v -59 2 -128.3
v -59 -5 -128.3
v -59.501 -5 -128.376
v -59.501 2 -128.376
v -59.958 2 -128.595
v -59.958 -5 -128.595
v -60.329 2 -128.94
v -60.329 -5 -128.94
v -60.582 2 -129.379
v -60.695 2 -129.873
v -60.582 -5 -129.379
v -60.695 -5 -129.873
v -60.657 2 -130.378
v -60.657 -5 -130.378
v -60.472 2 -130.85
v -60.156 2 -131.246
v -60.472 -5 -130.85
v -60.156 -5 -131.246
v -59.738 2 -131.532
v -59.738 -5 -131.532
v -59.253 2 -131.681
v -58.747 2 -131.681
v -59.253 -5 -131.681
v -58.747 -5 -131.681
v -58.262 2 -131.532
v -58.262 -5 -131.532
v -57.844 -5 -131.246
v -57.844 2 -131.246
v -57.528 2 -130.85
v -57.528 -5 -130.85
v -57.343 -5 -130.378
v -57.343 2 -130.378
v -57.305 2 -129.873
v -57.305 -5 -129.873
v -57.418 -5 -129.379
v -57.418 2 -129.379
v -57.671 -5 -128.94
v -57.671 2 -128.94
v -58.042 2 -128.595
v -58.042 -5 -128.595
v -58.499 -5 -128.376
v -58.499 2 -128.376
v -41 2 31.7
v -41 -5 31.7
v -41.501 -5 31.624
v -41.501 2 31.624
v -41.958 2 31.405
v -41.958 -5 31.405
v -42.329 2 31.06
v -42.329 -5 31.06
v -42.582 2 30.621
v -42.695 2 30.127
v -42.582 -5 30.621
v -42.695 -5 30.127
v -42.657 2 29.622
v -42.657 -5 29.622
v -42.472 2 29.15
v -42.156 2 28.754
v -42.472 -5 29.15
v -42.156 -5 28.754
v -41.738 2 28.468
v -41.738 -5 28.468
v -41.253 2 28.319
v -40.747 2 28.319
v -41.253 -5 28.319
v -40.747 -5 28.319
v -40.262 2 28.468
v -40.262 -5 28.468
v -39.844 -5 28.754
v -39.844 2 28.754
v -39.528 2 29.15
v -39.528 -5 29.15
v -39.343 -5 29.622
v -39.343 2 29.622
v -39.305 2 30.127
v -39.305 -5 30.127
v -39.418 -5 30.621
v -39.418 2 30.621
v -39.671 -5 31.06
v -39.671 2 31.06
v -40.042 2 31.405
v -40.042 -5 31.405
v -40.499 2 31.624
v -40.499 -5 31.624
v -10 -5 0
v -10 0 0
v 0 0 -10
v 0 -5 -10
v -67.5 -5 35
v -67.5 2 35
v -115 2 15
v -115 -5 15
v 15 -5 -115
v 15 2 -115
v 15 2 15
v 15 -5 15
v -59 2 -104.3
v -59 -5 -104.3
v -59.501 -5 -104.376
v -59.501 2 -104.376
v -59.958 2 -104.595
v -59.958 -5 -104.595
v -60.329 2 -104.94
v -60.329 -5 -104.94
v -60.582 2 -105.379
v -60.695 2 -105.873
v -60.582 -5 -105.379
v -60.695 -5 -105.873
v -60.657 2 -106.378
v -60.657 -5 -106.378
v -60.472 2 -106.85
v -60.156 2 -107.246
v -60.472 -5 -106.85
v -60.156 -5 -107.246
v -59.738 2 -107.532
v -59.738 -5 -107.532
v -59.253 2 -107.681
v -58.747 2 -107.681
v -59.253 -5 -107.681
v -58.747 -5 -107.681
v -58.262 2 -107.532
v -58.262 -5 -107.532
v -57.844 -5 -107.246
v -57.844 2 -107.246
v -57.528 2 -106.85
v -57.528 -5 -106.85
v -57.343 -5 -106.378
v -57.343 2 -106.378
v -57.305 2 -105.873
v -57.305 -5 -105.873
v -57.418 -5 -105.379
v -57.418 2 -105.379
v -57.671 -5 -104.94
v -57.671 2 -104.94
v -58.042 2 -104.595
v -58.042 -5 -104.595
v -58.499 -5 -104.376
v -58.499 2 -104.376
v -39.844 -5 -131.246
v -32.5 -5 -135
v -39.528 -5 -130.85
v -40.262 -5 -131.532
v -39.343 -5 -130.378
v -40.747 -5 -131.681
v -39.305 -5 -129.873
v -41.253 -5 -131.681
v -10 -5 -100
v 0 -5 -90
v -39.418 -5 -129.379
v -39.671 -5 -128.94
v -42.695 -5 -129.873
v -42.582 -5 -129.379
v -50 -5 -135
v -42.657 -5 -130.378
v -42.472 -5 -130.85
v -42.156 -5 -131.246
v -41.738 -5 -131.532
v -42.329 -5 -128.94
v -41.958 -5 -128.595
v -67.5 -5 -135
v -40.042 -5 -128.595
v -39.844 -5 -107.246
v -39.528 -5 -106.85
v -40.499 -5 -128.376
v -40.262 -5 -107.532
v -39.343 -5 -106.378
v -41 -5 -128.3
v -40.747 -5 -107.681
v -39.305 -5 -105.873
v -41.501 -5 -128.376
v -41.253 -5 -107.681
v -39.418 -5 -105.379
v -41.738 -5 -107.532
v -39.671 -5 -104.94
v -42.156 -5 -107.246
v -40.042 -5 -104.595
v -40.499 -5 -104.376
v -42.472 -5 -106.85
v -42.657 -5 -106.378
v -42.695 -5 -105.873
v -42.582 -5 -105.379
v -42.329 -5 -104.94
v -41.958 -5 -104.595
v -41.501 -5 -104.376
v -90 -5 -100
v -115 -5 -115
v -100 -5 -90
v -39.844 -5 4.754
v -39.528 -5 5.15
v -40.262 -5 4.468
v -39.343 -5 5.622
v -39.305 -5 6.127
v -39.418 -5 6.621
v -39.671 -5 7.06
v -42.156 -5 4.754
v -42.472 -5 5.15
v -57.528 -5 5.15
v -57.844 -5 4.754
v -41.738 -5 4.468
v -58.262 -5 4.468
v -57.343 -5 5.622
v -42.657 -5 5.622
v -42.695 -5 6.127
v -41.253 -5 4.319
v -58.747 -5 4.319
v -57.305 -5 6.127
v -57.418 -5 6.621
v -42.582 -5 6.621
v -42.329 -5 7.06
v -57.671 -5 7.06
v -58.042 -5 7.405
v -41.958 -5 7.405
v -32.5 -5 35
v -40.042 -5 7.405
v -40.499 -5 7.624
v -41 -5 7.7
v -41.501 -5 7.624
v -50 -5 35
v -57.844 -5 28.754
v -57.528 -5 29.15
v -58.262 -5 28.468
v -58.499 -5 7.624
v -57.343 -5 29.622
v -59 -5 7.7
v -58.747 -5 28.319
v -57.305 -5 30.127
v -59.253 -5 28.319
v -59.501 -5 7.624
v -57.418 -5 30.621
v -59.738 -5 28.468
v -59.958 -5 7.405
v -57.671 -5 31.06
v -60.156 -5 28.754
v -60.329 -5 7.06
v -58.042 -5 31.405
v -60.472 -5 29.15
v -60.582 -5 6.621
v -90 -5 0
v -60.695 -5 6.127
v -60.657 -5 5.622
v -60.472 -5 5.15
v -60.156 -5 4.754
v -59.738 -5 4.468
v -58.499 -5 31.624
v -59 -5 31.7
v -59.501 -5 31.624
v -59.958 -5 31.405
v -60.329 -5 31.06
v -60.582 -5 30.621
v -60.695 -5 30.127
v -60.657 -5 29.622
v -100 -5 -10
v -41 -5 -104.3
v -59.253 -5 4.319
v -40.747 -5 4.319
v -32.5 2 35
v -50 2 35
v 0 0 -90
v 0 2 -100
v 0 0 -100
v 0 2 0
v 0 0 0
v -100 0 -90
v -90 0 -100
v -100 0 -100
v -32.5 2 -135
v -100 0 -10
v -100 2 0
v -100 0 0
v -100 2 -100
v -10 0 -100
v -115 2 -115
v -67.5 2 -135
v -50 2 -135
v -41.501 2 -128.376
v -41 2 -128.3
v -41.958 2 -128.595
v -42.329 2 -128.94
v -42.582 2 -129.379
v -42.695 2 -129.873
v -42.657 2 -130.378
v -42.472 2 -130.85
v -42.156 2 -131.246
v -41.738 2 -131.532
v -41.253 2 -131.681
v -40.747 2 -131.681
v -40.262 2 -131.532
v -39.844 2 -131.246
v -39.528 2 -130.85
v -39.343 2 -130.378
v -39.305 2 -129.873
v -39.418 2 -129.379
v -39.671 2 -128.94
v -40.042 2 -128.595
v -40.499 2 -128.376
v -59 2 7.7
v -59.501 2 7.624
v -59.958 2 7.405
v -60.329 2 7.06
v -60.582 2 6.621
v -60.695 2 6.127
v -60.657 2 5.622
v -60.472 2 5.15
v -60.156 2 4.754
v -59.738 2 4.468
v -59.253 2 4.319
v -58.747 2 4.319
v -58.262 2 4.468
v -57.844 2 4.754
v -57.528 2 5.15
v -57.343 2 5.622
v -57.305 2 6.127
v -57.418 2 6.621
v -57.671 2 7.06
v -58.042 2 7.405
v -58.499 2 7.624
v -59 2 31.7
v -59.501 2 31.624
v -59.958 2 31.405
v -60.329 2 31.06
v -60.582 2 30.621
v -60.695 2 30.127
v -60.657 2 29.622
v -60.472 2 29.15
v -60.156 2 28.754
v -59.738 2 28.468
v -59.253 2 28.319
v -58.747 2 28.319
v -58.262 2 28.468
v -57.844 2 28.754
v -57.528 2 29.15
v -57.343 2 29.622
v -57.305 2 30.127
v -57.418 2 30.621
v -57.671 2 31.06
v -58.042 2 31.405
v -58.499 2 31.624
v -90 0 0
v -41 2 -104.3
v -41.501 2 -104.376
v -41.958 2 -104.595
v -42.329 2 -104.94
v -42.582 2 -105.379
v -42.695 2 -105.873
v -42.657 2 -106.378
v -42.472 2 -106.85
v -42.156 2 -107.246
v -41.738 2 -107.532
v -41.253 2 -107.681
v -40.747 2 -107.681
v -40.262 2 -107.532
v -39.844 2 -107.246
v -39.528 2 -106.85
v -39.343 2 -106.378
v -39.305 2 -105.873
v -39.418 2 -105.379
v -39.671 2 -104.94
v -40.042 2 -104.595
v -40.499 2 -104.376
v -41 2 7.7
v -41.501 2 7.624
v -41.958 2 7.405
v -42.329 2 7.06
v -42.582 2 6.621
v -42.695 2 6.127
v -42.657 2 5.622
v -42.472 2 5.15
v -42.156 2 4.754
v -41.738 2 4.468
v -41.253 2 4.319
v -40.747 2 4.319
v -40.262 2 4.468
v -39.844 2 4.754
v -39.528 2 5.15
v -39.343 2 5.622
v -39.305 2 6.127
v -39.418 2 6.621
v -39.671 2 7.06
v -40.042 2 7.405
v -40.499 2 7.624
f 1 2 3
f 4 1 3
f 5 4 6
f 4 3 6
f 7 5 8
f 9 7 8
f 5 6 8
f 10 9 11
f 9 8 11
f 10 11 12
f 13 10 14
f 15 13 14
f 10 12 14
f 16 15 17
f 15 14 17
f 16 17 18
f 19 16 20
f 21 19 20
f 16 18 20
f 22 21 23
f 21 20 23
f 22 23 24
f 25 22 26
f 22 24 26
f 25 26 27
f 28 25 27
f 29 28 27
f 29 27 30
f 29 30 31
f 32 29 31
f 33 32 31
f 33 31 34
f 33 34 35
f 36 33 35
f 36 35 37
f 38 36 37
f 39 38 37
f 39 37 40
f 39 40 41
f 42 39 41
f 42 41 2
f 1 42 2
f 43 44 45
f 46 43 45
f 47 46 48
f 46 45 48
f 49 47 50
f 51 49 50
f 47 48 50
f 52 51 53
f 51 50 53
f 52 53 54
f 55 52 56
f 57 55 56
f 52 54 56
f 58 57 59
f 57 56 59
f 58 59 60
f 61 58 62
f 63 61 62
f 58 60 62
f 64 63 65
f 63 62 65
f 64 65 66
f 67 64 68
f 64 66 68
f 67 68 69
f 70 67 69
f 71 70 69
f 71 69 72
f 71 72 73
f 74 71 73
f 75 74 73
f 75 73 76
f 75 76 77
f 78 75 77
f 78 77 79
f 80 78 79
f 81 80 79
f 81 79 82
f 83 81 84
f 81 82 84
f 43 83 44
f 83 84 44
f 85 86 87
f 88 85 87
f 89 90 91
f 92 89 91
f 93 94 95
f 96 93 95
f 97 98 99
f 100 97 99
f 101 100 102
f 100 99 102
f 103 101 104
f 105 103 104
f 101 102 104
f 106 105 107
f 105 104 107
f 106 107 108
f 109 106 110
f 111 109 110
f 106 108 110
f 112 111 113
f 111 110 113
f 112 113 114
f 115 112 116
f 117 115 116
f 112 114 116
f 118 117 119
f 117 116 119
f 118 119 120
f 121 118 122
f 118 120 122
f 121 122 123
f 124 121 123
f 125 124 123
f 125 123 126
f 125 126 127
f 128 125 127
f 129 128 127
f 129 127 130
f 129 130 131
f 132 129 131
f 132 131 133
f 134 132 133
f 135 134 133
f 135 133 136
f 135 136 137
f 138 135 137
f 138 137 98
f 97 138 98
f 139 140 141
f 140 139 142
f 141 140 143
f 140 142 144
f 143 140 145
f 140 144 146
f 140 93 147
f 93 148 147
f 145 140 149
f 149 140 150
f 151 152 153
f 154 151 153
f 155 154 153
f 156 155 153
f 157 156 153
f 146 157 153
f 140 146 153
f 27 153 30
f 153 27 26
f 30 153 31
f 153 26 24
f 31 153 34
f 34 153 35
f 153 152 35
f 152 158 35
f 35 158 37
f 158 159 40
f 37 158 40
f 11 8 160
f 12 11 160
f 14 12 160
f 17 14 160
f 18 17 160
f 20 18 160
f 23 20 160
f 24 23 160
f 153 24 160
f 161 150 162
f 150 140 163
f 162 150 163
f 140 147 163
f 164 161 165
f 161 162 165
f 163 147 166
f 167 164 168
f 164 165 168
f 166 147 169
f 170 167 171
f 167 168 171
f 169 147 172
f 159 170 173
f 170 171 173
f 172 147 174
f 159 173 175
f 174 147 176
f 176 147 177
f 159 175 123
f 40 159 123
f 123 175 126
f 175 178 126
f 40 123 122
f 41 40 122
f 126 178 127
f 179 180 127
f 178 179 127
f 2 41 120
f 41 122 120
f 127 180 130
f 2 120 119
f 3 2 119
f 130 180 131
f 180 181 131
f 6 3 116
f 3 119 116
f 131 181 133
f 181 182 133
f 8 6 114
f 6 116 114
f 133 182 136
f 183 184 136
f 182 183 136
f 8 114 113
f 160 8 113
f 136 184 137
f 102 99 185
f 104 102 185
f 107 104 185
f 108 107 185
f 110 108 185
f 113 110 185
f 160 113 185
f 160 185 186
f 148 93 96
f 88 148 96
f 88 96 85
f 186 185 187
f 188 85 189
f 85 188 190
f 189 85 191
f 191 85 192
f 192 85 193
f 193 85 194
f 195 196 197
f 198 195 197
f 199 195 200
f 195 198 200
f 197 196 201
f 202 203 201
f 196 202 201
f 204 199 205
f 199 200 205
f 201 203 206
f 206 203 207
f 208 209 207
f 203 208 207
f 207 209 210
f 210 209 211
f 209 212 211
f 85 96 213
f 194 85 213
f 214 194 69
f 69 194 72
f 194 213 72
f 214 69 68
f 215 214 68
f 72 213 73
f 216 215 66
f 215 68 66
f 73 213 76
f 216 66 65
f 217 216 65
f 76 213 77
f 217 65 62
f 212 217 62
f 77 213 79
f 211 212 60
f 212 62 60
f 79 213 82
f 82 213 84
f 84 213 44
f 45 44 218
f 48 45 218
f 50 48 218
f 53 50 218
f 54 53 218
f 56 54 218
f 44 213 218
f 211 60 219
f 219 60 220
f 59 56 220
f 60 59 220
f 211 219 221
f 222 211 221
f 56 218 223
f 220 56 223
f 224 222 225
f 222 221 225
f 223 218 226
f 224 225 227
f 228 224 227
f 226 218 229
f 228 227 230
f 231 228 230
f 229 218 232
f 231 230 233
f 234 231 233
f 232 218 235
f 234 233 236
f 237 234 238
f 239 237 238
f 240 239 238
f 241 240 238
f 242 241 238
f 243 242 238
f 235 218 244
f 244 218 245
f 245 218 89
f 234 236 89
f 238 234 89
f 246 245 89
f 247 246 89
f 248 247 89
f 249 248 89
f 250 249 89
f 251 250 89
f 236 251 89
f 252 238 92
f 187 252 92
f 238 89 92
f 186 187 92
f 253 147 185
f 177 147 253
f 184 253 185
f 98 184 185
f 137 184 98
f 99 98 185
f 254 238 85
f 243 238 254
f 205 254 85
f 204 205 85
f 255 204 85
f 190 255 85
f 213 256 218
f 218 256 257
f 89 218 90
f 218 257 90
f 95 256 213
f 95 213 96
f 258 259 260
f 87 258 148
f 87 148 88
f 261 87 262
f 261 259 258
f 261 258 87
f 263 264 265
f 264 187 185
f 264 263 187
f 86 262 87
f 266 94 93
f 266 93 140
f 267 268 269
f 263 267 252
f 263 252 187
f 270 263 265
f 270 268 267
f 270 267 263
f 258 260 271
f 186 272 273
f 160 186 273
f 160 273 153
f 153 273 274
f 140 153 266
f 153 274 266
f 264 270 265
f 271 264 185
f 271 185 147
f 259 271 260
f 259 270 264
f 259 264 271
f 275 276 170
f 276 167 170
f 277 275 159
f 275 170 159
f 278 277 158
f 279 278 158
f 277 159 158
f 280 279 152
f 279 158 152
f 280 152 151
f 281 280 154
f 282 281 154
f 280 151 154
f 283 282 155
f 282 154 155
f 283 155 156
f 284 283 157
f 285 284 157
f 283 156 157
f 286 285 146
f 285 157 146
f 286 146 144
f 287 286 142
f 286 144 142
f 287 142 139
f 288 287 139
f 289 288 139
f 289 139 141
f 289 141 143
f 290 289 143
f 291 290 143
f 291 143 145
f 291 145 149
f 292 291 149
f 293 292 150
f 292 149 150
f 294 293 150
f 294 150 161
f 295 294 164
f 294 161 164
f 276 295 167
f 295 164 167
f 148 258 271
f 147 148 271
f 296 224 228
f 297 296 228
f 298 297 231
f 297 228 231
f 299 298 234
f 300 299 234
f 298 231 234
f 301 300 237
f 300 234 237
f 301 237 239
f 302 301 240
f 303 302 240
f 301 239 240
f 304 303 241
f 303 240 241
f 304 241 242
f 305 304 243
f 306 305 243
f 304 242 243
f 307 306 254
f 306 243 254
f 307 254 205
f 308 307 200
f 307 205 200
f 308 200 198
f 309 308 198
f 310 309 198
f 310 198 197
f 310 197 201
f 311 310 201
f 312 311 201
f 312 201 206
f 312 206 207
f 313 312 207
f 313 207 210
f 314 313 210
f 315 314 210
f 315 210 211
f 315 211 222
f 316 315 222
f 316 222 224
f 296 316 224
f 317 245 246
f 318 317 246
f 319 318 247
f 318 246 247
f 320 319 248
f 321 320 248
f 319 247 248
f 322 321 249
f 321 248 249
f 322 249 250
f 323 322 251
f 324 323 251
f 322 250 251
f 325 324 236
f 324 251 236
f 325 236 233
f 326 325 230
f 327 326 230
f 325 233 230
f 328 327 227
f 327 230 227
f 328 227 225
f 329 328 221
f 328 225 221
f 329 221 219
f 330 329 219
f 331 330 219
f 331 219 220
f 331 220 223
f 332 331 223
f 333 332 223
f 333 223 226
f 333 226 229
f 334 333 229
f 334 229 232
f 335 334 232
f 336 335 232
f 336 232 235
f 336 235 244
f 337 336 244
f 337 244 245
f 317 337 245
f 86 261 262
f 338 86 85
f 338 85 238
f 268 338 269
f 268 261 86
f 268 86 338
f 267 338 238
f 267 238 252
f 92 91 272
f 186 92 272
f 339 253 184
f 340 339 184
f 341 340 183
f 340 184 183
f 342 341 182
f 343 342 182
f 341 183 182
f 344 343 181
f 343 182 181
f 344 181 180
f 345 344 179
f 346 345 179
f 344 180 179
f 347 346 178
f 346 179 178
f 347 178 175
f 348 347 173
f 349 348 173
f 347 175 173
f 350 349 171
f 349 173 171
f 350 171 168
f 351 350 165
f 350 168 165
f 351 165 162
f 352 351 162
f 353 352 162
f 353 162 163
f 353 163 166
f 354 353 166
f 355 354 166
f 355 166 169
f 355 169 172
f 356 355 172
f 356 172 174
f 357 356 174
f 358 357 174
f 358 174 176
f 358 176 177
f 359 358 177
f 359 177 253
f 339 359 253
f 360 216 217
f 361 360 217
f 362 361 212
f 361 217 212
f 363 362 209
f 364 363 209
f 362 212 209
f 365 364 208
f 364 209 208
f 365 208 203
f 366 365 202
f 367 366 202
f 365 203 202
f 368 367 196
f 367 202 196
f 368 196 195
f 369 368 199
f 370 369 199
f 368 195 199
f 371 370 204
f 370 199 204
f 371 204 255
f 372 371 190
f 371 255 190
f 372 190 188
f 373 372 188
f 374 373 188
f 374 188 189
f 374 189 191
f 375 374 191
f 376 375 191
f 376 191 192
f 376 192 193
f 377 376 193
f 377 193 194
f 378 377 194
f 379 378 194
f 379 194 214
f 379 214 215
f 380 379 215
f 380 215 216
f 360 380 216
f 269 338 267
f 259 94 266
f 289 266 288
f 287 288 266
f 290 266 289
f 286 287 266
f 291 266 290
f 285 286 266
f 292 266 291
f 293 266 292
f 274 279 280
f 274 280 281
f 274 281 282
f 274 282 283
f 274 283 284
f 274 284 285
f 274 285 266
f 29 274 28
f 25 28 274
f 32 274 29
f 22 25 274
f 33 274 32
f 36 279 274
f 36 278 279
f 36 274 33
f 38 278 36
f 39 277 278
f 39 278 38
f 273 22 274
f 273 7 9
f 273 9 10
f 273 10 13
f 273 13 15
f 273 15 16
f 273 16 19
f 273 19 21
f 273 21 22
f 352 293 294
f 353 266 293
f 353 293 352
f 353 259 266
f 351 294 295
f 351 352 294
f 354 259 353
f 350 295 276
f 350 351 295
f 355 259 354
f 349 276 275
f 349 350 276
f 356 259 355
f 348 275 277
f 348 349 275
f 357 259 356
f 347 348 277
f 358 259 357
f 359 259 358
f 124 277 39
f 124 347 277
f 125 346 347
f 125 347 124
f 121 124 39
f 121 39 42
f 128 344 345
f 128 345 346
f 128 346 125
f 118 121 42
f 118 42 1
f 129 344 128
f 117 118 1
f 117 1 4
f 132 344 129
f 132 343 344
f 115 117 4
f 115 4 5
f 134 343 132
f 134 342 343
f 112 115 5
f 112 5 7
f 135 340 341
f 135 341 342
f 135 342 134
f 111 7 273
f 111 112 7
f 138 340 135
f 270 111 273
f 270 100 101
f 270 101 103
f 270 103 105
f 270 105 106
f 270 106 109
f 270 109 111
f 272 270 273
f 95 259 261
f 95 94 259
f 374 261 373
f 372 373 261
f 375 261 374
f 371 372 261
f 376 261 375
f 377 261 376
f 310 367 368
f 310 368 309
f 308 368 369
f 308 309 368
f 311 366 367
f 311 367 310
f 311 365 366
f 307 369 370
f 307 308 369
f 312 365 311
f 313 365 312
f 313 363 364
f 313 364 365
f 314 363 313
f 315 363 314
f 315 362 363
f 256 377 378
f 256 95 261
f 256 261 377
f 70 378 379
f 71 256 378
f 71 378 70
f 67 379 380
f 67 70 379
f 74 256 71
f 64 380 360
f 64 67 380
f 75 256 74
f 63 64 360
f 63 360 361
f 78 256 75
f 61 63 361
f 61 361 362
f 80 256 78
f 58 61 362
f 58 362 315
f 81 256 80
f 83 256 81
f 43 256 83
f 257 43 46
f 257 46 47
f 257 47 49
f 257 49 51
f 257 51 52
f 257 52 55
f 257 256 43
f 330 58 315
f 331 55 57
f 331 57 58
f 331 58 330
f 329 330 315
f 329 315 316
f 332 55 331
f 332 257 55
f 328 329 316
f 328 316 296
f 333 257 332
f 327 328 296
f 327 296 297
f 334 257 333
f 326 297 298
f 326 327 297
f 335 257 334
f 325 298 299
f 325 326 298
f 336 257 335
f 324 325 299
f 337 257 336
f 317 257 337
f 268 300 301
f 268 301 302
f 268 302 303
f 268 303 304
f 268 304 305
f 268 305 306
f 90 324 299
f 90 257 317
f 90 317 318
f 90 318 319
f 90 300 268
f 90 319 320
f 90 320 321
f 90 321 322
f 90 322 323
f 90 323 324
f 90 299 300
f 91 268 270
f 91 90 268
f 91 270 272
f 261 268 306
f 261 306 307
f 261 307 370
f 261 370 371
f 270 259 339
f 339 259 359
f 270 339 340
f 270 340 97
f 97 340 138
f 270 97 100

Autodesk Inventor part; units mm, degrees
ref_plane "YZ Plane" through (0, 0, 0) normal (1, 0, 0) x (0, 1, 0)
ref_plane "XZ Plane" through (0, 0, 0) normal (0, 1, 0) x (-1, 0, 0)
ref_plane "XY Plane" through (0, 0, 0) normal (0, 0, 1) x (1, 0, 0)
sketch "Sketch1" plane through (0, 0, 0) normal (0, 1, 0) x (-1, 0, 0)
  line L0 (0, 0) -> (100, 0)
  line L1 (100, 0) -> (100, -100)
  line L2 (100, -100) -> (0, -100)
  line L3 (0, -100) -> (0, 0)
  line L4 (100, 0) -> (0, -100)
  line L5 (100, -100) -> (0, 0)
  line L6 (-15, 35) -> (115, 35)
  line L7 (115, 35) -> (115, -135)
  line L8 (115, -135) -> (-15, -135)
  line L9 (-15, -135) -> (-15, 35)
  line L10 (-15, 35) -> (115, -135) construction
  line L11 (115, 35) -> (-15, -135) construction
  line L12 (115, 35) -> (115, 15)
  line L13 (115, 15) -> (75, 15)
  line L14 (75, 15) -> (75, 35)
  line L15 (-15, 35) -> (-15, 15)
  line L16 (-15, 15) -> (25, 15)
  line L17 (25, 15) -> (25, 35)
  line L18 (75, 15) -> (67.5, 15)
  line L19 (67.5, 15) -> (67.5, 35)
  line L20 (25, 15) -> (32.5, 15)
  line L21 (32.5, 15) -> (32.5, 35)
  line L22 (32.5, 35) -> (-15, 15)
  line L23 (67.5, 35) -> (115, 15)
  line L24 (115, -135) -> (115, -115)
  line L25 (115, -115) -> (67.5, -115)
  line L26 (67.5, -115) -> (67.5, -135)
  line L27 (-15, -135) -> (-15, -115)
  line L28 (-15, -115) -> (32.5, -115)
  line L29 (32.5, -115) -> (32.5, -135)
  line L30 (115, -115) -> (67.5, -135)
  line L31 (-15, -115) -> (32.5, -135)
  line L32 (100, 0) -> (100, -10)
  line L33 (100, -10) -> (90, -10)
  line L34 (90, -10) -> (90, 0)
  line L35 (100, -100) -> (100, -90)
  line L36 (100, -90) -> (90, -90)
  line L37 (90, -90) -> (90, -100)
  line L38 (0, -100) -> (10, -100)
  line L39 (10, -100) -> (10, -90)
  line L40 (10, -90) -> (0, -90)
  line L41 (0, 0) -> (10, 0)
  line L42 (10, 0) -> (10, -10)
  line L43 (0, -10) -> (10, -10)
  line L44 (90, 0) -> (100, -10)
  line L45 (100, -90) -> (90, -100)
  line L46 (0, -90) -> (10, -100)
  line L47 (10, 0) -> (0, -10)
  line L48 (50, -135) -> (50, -130)
  line L49 (41, -130) -> (59, -130)
  line L50 (59, -130) -> (59, -106)
  line L51 (59, -106) -> (41, -106)
  line L52 (41, -106) -> (41, -130)
  line L53 (50, 35) -> (50, 30)
  line L54 (41, 30) -> (59, 30)
  line L55 (59, 30) -> (59, 6)
  line L56 (59, 6) -> (41, 6)
  line L57 (41, 6) -> (41, 30)
  point P0 (50, -50)
  dimension "d0" = 100
  dimension "d1" = 100
  dimension "d4" = 130
  dimension "d5" = 170
  dimension "d6" = 20
  dimension "d7" = 40
  dimension "d8" = 40
  dimension "d10" = 7.5
  dimension "d11" = 7.5
  dimension "d12" = 20
  dimension "d13" = 47.5
  dimension "d14" = 10
  dimension "d15" = 10
  dimension "d16" = 10
  dimension "d17" = 10
  dimension "d22" = 5
  dimension "d23" = 18
  dimension "d24" = 24
  dimension "d25" = 5
  dimension "d26" = 18
  dimension "d27" = 24
extrude "Extrusion1" add sketch "Sketch1" against normal blind 5 contours L5 L47 L3 | L0 L47 L5 | L0 L4 L44 | L46 L4 L3 | L1 L44 L4 | L4 L46 L2 | L1 L5 L45 | L5 L2 L45 | L49 L52 L51 L50 | L54 L55 L56 L57 | L16 L20 L21 L6 L19 L18 L13 L7 L25 L26 L8 L29 L28 L9 | L22 L17 L16 | L21 L20 L17 L22 | L28 L29 L31 | L23 L14 L18 L19 | L23 L13 L14 | L26 L25 L30
extrude "Extrusion2" add sketch "Sketch1" along normal blind 2 contours L49 L52 L51 L50 | L54 L55 L56 L57 | L16 L20 L21 L6 L19 L18 L13 L7 L25 L26 L8 L29 L28 L9 | L22 L17 L16 | L21 L20 L17 L22 | L28 L29 L31 | L23 L14 L18 L19 | L23 L13 L14 | L26 L25 L30
hole "Hole1" at (-59, 0, 30) at (-59, 0, 6) at (-41, 0, 30) at (-41, 0, 6) at (-59, 0, -130) at (-41, 0, -130) at (-41, 0, -106) at (-59, 0, -106) direction (0, -1, 0) diameter 3.4 end through all both
properties part number "BedHousingFrame"
